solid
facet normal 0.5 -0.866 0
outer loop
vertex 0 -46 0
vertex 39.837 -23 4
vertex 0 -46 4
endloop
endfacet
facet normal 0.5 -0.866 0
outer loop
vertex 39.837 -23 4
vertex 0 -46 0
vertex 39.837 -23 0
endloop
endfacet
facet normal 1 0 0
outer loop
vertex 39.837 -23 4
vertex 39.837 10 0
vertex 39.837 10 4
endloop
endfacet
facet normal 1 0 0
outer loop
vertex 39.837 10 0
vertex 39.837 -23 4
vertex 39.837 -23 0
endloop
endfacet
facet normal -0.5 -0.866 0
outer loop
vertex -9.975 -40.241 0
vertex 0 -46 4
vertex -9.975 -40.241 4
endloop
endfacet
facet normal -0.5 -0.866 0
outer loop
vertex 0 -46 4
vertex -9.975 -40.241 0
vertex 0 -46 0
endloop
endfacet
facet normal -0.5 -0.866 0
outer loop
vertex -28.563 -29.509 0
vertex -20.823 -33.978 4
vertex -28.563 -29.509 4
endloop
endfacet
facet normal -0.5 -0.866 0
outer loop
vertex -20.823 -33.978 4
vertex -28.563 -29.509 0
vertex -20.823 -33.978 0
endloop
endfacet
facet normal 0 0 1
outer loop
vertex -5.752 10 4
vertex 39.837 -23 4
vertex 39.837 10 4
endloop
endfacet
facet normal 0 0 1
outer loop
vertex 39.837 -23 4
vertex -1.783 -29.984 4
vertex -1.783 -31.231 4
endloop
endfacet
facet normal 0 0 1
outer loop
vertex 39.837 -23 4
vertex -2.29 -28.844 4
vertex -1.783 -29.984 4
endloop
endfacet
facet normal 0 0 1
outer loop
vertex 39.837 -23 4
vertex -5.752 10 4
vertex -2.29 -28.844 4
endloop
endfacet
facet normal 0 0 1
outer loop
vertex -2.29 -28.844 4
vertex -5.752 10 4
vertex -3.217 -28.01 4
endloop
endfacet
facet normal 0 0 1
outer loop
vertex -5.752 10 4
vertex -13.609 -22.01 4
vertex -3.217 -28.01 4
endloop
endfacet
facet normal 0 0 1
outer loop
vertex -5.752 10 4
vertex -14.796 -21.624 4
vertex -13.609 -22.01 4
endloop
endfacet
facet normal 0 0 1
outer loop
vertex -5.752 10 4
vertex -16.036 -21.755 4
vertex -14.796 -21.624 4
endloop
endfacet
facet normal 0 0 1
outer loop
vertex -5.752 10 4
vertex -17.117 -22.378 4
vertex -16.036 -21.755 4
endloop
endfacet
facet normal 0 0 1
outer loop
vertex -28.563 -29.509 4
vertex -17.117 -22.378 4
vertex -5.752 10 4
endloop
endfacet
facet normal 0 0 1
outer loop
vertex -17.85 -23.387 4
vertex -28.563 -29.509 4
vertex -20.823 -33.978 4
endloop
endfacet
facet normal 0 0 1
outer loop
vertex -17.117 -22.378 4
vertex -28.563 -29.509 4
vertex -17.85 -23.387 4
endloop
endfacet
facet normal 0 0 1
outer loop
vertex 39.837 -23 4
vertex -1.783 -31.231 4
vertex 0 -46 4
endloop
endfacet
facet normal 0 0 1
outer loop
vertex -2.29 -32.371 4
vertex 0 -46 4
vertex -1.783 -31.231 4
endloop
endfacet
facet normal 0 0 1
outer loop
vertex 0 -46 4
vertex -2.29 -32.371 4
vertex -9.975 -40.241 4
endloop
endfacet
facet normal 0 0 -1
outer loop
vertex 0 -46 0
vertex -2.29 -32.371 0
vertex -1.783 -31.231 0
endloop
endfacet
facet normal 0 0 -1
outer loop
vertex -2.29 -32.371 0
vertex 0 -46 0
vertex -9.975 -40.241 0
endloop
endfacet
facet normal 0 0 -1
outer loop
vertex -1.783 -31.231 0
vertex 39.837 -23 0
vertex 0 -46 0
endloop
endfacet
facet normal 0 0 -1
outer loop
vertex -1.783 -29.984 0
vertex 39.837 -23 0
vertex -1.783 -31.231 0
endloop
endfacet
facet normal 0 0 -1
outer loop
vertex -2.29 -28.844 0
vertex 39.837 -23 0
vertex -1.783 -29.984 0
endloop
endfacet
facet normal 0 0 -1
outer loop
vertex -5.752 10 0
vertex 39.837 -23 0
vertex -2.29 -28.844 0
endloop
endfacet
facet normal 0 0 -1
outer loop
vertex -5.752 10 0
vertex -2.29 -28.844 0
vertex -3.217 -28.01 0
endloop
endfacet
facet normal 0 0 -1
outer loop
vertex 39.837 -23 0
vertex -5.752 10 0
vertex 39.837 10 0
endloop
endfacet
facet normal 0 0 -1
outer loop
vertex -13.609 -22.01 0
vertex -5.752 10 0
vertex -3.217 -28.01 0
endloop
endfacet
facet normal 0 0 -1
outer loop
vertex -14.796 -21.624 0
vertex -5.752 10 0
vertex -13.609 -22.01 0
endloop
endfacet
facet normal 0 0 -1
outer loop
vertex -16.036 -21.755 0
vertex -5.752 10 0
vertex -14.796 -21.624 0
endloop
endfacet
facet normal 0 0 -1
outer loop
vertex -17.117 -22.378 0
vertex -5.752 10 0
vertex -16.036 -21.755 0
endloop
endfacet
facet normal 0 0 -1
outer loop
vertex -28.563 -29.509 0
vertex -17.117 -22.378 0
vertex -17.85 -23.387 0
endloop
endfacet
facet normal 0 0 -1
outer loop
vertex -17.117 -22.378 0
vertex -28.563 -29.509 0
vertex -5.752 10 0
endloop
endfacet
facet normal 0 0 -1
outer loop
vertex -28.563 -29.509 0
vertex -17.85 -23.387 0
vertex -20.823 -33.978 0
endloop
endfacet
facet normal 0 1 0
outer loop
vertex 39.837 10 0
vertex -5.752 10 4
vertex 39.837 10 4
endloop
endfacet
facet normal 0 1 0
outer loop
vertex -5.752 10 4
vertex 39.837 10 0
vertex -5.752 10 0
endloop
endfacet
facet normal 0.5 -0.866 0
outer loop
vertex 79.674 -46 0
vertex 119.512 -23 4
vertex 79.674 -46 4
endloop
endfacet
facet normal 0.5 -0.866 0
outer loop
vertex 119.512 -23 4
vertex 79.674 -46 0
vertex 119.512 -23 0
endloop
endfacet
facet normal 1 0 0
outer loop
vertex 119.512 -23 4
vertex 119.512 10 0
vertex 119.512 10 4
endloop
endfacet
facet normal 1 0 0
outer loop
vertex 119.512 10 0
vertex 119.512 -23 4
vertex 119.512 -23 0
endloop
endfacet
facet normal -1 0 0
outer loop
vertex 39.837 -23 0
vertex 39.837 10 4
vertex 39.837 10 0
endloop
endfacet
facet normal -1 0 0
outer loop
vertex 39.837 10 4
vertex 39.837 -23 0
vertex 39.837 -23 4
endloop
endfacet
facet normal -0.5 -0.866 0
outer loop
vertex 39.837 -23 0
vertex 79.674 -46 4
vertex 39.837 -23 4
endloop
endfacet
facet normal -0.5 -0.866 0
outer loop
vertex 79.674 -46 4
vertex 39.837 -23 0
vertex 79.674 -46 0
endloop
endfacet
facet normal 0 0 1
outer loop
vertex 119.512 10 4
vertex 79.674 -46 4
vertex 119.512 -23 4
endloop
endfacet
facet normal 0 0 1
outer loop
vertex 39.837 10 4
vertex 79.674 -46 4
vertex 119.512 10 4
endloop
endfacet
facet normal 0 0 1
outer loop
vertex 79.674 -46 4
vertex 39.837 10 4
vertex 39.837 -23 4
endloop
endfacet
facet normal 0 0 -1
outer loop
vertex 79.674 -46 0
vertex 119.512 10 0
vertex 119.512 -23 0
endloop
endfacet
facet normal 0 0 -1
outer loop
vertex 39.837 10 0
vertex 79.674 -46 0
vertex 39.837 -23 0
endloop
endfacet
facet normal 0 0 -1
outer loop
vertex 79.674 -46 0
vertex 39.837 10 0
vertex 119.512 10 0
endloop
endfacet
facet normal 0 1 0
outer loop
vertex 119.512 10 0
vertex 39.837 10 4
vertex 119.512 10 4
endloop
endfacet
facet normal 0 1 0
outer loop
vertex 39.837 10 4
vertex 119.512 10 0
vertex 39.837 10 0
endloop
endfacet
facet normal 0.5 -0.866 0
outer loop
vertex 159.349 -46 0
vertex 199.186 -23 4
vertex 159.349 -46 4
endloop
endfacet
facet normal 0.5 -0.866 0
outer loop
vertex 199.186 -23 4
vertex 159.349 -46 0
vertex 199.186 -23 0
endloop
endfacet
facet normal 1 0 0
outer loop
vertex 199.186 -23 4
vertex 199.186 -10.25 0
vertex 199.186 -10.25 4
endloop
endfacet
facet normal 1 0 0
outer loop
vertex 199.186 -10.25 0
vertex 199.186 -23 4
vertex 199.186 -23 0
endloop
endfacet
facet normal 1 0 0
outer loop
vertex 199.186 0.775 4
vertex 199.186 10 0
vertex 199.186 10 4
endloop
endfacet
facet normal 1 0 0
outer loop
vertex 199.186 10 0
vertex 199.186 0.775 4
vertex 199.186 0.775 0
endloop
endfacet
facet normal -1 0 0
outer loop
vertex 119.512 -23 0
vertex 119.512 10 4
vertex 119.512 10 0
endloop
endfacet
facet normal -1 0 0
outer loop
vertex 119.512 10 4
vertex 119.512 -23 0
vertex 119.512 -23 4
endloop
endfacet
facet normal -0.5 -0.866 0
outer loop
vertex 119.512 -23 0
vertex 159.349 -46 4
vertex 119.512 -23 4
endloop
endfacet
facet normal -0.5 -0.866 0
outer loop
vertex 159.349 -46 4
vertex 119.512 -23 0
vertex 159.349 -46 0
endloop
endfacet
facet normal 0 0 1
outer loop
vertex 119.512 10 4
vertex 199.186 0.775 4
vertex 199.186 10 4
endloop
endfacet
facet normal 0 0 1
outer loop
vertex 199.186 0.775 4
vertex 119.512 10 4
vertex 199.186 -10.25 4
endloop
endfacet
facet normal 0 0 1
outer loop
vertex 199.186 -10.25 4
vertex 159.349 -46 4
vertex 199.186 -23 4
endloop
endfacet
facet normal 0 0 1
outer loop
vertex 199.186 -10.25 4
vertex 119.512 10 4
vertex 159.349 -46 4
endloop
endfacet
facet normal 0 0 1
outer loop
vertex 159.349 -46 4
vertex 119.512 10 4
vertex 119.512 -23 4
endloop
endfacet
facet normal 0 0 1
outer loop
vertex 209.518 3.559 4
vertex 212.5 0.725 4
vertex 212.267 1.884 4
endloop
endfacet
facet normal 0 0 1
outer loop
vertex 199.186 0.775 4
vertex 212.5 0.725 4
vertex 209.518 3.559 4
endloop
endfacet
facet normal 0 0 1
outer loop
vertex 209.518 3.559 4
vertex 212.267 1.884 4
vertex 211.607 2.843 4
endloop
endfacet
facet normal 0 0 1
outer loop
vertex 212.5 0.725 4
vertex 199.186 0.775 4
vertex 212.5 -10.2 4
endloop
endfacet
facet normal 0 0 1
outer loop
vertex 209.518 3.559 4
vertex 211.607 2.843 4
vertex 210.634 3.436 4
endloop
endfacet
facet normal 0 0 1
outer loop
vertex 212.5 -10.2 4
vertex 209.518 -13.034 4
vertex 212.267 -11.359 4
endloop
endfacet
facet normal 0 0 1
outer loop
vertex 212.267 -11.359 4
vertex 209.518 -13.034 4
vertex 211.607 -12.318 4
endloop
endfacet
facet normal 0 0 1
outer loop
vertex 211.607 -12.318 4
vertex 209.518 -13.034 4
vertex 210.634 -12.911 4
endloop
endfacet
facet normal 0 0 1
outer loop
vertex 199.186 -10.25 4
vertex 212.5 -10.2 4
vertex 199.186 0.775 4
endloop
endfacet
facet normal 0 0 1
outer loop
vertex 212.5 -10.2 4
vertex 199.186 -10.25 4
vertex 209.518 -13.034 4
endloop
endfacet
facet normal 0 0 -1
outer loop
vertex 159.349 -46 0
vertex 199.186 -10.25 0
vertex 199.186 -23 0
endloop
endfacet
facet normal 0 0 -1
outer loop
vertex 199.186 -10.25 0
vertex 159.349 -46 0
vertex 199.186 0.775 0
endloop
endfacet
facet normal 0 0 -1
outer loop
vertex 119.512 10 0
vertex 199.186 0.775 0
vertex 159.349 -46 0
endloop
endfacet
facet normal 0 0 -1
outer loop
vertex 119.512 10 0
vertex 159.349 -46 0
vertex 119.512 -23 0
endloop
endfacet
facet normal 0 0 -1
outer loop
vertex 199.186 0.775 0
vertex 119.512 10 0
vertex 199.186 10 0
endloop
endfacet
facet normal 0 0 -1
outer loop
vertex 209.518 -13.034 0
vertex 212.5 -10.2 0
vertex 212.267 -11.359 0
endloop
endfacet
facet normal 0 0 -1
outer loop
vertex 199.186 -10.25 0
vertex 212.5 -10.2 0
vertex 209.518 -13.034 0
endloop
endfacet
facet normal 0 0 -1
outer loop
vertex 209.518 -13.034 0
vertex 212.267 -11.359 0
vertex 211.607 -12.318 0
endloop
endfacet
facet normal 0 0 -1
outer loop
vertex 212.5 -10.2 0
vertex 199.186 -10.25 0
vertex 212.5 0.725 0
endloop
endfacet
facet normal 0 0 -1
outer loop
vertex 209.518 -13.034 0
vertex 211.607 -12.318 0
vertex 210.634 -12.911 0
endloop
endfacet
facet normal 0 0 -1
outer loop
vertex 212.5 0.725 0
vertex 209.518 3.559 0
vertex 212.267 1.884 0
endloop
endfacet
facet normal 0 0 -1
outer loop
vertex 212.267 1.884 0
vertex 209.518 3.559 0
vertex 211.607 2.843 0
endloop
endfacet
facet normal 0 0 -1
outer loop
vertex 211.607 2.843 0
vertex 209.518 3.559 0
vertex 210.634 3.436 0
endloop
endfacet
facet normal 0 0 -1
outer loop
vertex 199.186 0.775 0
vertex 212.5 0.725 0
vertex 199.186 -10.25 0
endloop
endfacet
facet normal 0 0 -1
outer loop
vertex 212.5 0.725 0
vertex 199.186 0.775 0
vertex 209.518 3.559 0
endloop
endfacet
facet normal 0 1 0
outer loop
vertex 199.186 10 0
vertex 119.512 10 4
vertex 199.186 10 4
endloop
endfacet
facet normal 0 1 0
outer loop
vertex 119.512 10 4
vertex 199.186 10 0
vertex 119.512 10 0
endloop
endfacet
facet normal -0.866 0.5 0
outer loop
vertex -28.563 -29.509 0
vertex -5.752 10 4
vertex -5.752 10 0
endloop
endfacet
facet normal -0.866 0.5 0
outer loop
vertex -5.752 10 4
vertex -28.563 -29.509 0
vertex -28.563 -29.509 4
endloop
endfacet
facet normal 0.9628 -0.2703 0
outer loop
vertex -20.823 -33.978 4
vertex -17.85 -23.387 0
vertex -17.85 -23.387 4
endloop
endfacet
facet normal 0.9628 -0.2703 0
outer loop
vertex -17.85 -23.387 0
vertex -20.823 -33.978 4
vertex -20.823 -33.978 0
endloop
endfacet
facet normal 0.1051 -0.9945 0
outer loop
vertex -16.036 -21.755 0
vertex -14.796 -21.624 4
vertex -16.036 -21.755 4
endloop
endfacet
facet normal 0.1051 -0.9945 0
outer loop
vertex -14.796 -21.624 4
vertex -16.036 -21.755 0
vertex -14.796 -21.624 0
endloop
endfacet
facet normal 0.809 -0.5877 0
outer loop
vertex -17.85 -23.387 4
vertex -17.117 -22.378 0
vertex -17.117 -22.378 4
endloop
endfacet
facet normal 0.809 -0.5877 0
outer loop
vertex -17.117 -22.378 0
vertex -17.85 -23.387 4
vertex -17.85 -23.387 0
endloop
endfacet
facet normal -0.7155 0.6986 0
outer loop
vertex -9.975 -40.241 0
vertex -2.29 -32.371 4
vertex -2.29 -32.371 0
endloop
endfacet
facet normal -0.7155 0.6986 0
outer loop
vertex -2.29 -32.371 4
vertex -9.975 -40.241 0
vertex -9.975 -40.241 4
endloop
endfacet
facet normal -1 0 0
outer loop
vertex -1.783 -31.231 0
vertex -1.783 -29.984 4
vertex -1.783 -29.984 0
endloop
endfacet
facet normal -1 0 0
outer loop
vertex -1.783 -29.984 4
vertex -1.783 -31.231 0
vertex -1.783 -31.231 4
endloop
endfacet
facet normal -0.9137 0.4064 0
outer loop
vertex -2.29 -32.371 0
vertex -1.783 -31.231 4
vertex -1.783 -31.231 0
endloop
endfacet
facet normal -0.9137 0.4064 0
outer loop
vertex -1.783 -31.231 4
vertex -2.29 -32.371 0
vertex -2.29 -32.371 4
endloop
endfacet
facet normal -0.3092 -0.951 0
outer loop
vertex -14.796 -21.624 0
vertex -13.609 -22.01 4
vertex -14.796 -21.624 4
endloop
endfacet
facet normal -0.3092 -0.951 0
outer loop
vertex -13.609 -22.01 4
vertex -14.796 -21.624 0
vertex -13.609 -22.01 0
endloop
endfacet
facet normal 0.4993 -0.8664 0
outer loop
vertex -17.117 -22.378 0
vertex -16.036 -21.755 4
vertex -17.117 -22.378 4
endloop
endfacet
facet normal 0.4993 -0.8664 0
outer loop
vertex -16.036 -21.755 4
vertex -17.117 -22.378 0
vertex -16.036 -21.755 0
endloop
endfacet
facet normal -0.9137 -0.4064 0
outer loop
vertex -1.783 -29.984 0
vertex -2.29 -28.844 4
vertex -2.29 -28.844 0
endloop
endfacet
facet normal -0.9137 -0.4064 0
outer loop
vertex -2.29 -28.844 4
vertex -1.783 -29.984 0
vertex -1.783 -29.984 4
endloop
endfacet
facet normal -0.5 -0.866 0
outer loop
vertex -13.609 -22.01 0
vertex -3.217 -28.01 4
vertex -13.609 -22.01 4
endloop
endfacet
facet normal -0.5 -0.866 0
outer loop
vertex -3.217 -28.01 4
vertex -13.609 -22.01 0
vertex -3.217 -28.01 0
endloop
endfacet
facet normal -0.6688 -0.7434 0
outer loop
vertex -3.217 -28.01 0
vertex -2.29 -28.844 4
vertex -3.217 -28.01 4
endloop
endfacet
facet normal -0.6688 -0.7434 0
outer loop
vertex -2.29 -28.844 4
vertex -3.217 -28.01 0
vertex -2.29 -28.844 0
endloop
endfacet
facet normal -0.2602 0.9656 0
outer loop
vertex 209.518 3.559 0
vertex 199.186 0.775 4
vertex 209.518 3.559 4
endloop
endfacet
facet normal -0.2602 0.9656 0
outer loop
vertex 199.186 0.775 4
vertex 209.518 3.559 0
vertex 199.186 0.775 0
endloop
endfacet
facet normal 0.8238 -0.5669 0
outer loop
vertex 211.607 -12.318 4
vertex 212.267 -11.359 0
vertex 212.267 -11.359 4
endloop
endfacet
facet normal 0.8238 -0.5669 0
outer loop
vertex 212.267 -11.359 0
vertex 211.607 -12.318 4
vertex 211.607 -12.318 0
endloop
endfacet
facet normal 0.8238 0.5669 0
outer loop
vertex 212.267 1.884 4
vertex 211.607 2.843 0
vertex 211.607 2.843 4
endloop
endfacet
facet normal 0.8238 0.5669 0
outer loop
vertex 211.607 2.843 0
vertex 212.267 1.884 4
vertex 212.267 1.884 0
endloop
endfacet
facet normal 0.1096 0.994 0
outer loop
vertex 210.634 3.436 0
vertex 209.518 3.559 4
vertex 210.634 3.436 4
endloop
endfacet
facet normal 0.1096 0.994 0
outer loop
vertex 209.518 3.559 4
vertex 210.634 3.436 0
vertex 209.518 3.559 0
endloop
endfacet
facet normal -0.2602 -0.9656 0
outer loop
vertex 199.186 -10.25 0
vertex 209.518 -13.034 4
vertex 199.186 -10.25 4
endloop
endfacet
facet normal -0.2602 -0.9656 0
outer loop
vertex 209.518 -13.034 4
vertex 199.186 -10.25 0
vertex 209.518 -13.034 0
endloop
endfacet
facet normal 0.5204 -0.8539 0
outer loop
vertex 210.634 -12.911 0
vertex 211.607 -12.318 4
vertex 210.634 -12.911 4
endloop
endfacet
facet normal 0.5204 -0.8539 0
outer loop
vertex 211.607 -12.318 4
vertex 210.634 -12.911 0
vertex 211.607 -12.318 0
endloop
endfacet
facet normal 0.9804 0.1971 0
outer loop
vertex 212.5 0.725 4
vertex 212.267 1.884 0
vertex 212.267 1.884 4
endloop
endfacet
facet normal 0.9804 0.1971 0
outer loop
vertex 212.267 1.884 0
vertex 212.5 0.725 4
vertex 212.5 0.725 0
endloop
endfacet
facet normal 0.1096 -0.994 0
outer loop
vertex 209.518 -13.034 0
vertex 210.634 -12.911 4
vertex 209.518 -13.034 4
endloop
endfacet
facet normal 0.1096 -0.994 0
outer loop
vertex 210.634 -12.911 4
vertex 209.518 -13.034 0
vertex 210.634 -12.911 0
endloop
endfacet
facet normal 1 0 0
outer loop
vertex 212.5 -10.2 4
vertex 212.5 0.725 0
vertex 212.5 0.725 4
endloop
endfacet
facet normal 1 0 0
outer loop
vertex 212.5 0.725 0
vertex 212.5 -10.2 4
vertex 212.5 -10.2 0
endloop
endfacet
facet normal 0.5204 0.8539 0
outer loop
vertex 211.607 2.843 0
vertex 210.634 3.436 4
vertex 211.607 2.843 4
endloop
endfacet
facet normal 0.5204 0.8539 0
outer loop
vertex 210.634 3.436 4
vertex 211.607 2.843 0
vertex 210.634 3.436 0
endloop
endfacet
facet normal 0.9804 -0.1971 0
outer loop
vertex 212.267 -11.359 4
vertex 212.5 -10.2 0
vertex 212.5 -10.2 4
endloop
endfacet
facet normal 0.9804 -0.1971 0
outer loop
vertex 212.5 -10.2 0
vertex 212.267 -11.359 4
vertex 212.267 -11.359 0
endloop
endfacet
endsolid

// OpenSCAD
//
// Settlers of Catan ocean borders
// For use with the OEM hex tiles and pieces
// Design by Chris Sammis, 2017
//

/****** Constants ********************/
hex_side                = 46;
ocean_height            = 4;
ocean_segment_length    = 80;
connector_edge_length   = 12;
connector_corner_radius = 3;

/*** Helpful calculations ************/
flat_side_length    = (hex_side / 2) + 10;
connector_size      = connector_edge_length + connector_corner_radius;
connector_y_offset  = (connector_size / -2) - 3;


module hexagon(side, height)
{
    cylinder(r=side, h=height, $fn=6);
}

module ocean_connector(edge_length, edge_width, height)
{
    hull()
    {
        cube([1, edge_width, height]);
        translate([edge_length, 0, 0])
        {
            cylinder(r=connector_corner_radius, h=height, $fn=15);
        }
        translate([edge_length, edge_width, 0])
        {
            cylinder(r=connector_corner_radius, h=height, $fn=15);
        }
    }
}

// The ocean_segment is one peak in a border piece
module ocean_segment()
{
    cutout_length = ocean_segment_length + 2;
    difference()
    {
        rotate([0, 0, 30])
        {
            hexagon(hex_side, ocean_height);
        }
        translate([cutout_length / -2, 10, -0.02])
        {
            cube([cutout_length, hex_side, ocean_height + 0.04]);
        }
    }
}

module ocean_expander()
{
    connector_x_offset = (hex_side / 2 + connector_size);
    
    difference()
    {
        ocean_segment();
        
        translate([connector_x_offset - ocean_segment_length, connector_y_offset, -0.02])
        {
            ocean_connector(connector_edge_length, connector_edge_length, ocean_height + 0.04);
        }
    }
    
    // Y translate scale factor of 0.025: half of the Y dimension scale() (0.05)
    translate([connector_x_offset + connector_corner_radius / 2,
               connector_y_offset + (connector_edge_length * 0.025),
               0])
    {
        scale([0.9, 0.95, 1.0])
        {
            ocean_connector(connector_edge_length, connector_edge_length - 0.5, ocean_height);
        }
    }
}

module ocean_border()
{
    hex_inradius        = (sqrt(3) * hex_side) / 2;
    connector_x_offset  = (hex_side * 4 + connector_size);
    difference()
    {
        union()
        {
            ocean_segment();
            translate([hex_inradius * 2, 0, 0])
            {
                ocean_segment();
            }
            translate([hex_inradius * 4, 0, 0])
            {
                ocean_segment();
            }
        }
        
        cutoff_x        = sin(60) * flat_side_length * -1;
        cutoff_width    = 40;
        
        // Chop off from the side without the connector
        translate([cutoff_x - cutoff_width, -100, -0.02])
        {
            cube([cutoff_width, 200, ocean_height + 0.04]);
        }
   
        // Create the angled side. I have no idea with this Y translation. I eyeballed it.
        translate([cutoff_x, hex_inradius * -1 + 10.3, -0.02])
        {
            rotate([0, 0, 60])
            {
                cube([50, 50, ocean_height + 0.04]);
            }
        }
        
        connector_x = cutoff_x * (2.25/6); // A tiny bit more than a third
        translate([connector_x, -41, -0.02])
        {
            rotate([0, 0, 60])
            {
                ocean_connector(connector_edge_length, connector_edge_length, ocean_height + 0.04);
            }
        }
    }
    
    // Y translate scale factor of 0.025: half of the Y dimension scale() (0.05)
    translate([connector_x_offset, connector_y_offset + (connector_edge_length * 0.025), 0])
    {
        scale([0.9, 0.95, 1.0])
        {
            ocean_connector(connector_edge_length, connector_edge_length - 0.5, ocean_height);
        }
    }
}

// The base game includes six ocean_border() pieces
ocean_border();

// The 5-6 player expansion includes four ocean_expander() pieces
//ocean_expander();
